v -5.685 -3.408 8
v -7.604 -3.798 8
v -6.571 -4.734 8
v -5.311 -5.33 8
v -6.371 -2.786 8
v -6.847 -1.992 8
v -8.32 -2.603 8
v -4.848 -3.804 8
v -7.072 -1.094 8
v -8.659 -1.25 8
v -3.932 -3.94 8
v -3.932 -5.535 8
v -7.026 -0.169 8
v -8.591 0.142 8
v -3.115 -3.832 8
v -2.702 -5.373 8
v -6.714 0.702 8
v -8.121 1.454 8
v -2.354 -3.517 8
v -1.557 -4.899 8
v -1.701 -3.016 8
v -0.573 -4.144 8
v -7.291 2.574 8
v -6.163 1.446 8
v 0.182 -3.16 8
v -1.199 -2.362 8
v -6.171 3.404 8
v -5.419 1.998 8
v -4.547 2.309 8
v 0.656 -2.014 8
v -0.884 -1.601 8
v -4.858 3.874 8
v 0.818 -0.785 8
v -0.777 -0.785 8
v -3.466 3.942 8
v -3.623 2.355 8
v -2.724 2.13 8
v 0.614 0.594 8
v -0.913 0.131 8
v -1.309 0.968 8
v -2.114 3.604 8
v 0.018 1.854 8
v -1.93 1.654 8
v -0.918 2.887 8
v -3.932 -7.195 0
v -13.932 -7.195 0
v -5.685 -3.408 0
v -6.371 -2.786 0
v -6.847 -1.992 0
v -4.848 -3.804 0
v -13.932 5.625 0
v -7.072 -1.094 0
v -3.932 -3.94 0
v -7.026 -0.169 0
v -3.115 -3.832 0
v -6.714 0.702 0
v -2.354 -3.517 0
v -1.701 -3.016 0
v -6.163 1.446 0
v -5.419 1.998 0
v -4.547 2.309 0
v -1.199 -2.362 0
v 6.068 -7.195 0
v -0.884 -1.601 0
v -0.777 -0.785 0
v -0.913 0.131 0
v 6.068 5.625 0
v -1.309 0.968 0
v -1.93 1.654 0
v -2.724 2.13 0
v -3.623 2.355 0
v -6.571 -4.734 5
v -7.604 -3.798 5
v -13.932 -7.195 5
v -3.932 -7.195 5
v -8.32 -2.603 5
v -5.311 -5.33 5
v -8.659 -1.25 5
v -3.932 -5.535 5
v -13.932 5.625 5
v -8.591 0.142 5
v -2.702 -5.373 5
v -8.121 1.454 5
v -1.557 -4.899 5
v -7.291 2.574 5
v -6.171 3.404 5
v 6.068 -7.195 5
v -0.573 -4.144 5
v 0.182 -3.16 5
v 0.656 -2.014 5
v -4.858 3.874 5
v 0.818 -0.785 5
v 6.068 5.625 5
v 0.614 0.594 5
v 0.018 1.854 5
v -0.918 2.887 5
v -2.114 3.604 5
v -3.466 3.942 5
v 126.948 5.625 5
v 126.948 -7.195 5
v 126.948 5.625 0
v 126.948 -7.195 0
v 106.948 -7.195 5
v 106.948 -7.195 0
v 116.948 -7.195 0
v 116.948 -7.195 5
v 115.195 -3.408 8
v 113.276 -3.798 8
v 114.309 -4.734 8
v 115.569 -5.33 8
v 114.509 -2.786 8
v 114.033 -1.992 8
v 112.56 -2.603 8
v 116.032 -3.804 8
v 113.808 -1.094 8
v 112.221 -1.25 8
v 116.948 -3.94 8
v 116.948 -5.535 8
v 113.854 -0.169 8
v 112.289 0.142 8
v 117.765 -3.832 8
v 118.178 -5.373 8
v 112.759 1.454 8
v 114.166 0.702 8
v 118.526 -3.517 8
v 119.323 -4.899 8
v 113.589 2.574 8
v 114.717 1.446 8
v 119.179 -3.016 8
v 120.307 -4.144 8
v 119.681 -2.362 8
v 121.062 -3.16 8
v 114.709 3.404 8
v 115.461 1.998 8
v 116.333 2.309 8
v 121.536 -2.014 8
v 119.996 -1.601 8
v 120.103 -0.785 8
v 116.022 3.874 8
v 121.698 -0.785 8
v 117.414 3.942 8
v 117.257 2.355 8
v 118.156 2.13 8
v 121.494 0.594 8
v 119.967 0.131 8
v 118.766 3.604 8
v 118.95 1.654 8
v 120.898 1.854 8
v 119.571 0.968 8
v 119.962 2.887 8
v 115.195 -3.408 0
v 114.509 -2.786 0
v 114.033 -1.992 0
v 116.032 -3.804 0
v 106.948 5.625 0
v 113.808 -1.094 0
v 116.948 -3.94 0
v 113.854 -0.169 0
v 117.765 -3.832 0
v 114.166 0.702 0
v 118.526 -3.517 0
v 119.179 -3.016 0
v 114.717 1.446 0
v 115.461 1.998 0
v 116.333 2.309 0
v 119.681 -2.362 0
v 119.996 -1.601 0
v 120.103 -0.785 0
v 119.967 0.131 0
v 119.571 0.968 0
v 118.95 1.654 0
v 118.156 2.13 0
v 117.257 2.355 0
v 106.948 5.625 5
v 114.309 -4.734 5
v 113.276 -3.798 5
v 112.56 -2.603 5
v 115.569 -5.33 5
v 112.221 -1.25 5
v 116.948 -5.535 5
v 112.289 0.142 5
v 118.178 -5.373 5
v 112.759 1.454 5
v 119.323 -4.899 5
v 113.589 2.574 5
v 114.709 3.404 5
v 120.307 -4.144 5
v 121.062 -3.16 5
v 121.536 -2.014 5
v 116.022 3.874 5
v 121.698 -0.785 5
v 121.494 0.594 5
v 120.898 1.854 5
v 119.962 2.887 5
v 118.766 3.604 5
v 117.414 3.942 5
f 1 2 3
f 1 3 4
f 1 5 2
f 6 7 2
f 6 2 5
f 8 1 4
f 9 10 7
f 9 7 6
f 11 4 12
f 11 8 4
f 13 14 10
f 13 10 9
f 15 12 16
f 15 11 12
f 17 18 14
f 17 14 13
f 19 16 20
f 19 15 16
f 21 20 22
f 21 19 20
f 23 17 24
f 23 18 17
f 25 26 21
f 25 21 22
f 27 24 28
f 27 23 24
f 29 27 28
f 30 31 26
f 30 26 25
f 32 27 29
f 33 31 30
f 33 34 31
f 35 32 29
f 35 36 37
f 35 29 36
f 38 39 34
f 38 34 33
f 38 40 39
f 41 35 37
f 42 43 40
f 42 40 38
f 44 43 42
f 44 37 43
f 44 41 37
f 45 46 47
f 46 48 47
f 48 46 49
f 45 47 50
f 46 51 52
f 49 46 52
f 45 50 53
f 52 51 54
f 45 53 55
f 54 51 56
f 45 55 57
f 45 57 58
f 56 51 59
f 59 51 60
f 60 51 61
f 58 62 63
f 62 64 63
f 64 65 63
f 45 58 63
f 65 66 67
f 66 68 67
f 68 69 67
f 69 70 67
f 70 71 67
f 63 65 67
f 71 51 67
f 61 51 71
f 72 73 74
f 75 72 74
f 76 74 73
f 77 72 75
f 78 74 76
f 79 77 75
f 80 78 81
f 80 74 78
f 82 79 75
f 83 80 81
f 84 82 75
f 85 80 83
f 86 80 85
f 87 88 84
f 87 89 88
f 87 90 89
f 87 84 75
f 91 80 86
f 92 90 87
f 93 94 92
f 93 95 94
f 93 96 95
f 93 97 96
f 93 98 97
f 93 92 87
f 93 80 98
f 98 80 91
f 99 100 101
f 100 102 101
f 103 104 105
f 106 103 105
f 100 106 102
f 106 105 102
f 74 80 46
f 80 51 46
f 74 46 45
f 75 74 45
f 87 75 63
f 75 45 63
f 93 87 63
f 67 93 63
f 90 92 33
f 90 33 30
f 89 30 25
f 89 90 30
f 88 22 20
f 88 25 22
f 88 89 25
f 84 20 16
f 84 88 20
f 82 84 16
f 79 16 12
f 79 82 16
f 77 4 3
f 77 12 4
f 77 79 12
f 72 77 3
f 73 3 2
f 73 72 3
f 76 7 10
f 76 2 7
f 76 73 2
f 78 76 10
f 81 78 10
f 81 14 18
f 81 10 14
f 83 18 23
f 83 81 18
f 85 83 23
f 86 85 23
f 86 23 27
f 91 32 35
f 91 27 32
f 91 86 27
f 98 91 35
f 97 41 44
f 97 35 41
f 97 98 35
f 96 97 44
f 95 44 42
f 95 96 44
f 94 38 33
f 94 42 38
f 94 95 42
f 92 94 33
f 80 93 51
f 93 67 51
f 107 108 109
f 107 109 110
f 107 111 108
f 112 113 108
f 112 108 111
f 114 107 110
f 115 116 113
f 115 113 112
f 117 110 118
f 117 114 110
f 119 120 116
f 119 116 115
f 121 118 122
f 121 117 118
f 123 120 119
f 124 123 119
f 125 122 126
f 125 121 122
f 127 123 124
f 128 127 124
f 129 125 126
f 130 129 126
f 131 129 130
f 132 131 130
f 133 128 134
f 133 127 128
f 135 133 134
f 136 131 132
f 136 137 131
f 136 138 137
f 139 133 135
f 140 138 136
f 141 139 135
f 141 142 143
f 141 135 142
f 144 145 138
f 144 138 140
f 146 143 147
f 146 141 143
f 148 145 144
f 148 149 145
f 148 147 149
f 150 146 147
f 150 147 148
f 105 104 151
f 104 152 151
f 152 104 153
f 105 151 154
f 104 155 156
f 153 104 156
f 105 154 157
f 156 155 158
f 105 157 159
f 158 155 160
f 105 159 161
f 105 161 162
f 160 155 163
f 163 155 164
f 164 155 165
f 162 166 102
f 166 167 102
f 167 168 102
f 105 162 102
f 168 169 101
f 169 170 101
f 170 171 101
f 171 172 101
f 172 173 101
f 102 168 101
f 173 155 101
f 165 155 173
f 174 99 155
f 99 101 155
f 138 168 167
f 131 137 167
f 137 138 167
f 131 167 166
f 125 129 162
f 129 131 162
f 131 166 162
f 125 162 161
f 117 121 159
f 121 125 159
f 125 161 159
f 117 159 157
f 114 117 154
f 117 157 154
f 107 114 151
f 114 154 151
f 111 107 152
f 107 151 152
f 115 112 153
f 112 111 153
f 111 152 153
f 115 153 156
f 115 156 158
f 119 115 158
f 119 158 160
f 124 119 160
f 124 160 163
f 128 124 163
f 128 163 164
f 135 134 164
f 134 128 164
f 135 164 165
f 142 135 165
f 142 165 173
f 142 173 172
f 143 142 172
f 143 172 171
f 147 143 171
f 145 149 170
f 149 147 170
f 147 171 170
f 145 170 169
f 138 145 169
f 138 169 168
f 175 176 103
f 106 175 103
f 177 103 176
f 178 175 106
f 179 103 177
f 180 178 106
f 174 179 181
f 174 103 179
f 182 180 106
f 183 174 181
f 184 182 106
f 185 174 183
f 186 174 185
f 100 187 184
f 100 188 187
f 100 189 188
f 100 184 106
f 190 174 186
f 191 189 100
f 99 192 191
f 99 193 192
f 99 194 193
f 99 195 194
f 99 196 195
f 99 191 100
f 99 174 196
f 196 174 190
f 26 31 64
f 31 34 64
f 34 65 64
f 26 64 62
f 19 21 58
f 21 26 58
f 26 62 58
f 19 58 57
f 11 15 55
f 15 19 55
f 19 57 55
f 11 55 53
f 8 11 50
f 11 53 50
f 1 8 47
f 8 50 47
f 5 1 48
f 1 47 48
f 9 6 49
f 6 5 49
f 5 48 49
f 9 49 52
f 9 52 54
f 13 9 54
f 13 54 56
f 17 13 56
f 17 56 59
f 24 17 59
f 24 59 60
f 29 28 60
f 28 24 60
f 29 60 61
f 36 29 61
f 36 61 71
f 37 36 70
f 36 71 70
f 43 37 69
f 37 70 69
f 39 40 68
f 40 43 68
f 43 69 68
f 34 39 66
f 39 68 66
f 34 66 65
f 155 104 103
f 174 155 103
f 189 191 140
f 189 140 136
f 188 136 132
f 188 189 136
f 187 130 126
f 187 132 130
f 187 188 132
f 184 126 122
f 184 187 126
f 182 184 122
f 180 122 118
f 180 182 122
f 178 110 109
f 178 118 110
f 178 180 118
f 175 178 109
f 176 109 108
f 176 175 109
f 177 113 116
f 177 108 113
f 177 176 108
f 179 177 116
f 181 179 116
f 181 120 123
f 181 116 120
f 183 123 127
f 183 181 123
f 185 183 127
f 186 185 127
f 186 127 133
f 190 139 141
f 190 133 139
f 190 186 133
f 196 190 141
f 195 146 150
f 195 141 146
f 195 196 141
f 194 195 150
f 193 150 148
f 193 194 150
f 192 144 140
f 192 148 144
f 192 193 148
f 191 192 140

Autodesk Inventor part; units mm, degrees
ref_plane "YZ Plane" through (0, 0, 0) normal (1, 0, 0) x (0, 1, 0)
ref_plane "XZ Plane" through (0, 0, 0) normal (0, 1, 0) x (-1, 0, 0)
ref_plane "XY Plane" through (0, 0, 0) normal (0, 0, 1) x (1, 0, 0)
sketch "Boceto1" plane through (0, 0, 0) normal (0, 0, 1) x (1, 0, 0)
  line L0 (-13.9318, 5.6251) -> (-13.9318, -7.1948)
  line L1 (-13.9318, -7.1948) -> (126.9482, -7.1948)
  line L2 (126.9482, -7.1948) -> (126.9482, 5.6251)
  line L3 (126.9482, 5.6251) -> (-13.9318, 5.6251)
  line L4 (126.9482, -7.1948) -> (116.9482, -7.1948)
  line L5 (116.9482, -7.1948) -> (116.9482, -0.7849)
  circle A0 centre (116.9482, -0.7849) radius 3.155
  line L6 (-13.9318, -7.1948) -> (-3.9318, -7.1948)
  line L7 (-3.9318, -7.1948) -> (-3.9318, -0.7849)
  circle A1 centre (-3.9318, -0.7849) radius 3.155
  circle A2 centre (-3.9318, -0.7849) radius 4.75
  circle A3 centre (116.9482, -0.7849) radius 4.75
  point P0 (0, 0)
  dimension "d1" = 10
  dimension "d2" = 6.31
  dimension "d4" = 6.31
  dimension "d5" = 6.41
  dimension "d6" = 6.41
  dimension "d7" = 9.5
  dimension "d8" = 9.5
extrude "Extrusión1" add sketch "Boceto1" along normal blind 5 contours L3 L2 L1 L0
extrude "Extrusión2" add sketch "Boceto1" along normal blind 8 contours A2 | A3
sketch "Boceto2" plane through (-13.9318, -7.1948, 0) normal (0, -1, 0) x (1, 0, 0)
  line L0 (0, 0) -> (0, 5) projected
  line L1 (0, 0) -> (140.88, 0) projected
  line L2 (140.88, 0) -> (120.88, 0)
  line L3 (120.88, 0) -> (120.88, 5)
  line L4 (120.88, 5) -> (20, 5)
  line L5 (20, 5) -> (20, 0)
  point P0 (13.9318, 0)
extrude "Extrusión3" cut sketch "Boceto2" against normal through all
properties part number "palito arriba de la banda" material "PVC, no plastificado"
